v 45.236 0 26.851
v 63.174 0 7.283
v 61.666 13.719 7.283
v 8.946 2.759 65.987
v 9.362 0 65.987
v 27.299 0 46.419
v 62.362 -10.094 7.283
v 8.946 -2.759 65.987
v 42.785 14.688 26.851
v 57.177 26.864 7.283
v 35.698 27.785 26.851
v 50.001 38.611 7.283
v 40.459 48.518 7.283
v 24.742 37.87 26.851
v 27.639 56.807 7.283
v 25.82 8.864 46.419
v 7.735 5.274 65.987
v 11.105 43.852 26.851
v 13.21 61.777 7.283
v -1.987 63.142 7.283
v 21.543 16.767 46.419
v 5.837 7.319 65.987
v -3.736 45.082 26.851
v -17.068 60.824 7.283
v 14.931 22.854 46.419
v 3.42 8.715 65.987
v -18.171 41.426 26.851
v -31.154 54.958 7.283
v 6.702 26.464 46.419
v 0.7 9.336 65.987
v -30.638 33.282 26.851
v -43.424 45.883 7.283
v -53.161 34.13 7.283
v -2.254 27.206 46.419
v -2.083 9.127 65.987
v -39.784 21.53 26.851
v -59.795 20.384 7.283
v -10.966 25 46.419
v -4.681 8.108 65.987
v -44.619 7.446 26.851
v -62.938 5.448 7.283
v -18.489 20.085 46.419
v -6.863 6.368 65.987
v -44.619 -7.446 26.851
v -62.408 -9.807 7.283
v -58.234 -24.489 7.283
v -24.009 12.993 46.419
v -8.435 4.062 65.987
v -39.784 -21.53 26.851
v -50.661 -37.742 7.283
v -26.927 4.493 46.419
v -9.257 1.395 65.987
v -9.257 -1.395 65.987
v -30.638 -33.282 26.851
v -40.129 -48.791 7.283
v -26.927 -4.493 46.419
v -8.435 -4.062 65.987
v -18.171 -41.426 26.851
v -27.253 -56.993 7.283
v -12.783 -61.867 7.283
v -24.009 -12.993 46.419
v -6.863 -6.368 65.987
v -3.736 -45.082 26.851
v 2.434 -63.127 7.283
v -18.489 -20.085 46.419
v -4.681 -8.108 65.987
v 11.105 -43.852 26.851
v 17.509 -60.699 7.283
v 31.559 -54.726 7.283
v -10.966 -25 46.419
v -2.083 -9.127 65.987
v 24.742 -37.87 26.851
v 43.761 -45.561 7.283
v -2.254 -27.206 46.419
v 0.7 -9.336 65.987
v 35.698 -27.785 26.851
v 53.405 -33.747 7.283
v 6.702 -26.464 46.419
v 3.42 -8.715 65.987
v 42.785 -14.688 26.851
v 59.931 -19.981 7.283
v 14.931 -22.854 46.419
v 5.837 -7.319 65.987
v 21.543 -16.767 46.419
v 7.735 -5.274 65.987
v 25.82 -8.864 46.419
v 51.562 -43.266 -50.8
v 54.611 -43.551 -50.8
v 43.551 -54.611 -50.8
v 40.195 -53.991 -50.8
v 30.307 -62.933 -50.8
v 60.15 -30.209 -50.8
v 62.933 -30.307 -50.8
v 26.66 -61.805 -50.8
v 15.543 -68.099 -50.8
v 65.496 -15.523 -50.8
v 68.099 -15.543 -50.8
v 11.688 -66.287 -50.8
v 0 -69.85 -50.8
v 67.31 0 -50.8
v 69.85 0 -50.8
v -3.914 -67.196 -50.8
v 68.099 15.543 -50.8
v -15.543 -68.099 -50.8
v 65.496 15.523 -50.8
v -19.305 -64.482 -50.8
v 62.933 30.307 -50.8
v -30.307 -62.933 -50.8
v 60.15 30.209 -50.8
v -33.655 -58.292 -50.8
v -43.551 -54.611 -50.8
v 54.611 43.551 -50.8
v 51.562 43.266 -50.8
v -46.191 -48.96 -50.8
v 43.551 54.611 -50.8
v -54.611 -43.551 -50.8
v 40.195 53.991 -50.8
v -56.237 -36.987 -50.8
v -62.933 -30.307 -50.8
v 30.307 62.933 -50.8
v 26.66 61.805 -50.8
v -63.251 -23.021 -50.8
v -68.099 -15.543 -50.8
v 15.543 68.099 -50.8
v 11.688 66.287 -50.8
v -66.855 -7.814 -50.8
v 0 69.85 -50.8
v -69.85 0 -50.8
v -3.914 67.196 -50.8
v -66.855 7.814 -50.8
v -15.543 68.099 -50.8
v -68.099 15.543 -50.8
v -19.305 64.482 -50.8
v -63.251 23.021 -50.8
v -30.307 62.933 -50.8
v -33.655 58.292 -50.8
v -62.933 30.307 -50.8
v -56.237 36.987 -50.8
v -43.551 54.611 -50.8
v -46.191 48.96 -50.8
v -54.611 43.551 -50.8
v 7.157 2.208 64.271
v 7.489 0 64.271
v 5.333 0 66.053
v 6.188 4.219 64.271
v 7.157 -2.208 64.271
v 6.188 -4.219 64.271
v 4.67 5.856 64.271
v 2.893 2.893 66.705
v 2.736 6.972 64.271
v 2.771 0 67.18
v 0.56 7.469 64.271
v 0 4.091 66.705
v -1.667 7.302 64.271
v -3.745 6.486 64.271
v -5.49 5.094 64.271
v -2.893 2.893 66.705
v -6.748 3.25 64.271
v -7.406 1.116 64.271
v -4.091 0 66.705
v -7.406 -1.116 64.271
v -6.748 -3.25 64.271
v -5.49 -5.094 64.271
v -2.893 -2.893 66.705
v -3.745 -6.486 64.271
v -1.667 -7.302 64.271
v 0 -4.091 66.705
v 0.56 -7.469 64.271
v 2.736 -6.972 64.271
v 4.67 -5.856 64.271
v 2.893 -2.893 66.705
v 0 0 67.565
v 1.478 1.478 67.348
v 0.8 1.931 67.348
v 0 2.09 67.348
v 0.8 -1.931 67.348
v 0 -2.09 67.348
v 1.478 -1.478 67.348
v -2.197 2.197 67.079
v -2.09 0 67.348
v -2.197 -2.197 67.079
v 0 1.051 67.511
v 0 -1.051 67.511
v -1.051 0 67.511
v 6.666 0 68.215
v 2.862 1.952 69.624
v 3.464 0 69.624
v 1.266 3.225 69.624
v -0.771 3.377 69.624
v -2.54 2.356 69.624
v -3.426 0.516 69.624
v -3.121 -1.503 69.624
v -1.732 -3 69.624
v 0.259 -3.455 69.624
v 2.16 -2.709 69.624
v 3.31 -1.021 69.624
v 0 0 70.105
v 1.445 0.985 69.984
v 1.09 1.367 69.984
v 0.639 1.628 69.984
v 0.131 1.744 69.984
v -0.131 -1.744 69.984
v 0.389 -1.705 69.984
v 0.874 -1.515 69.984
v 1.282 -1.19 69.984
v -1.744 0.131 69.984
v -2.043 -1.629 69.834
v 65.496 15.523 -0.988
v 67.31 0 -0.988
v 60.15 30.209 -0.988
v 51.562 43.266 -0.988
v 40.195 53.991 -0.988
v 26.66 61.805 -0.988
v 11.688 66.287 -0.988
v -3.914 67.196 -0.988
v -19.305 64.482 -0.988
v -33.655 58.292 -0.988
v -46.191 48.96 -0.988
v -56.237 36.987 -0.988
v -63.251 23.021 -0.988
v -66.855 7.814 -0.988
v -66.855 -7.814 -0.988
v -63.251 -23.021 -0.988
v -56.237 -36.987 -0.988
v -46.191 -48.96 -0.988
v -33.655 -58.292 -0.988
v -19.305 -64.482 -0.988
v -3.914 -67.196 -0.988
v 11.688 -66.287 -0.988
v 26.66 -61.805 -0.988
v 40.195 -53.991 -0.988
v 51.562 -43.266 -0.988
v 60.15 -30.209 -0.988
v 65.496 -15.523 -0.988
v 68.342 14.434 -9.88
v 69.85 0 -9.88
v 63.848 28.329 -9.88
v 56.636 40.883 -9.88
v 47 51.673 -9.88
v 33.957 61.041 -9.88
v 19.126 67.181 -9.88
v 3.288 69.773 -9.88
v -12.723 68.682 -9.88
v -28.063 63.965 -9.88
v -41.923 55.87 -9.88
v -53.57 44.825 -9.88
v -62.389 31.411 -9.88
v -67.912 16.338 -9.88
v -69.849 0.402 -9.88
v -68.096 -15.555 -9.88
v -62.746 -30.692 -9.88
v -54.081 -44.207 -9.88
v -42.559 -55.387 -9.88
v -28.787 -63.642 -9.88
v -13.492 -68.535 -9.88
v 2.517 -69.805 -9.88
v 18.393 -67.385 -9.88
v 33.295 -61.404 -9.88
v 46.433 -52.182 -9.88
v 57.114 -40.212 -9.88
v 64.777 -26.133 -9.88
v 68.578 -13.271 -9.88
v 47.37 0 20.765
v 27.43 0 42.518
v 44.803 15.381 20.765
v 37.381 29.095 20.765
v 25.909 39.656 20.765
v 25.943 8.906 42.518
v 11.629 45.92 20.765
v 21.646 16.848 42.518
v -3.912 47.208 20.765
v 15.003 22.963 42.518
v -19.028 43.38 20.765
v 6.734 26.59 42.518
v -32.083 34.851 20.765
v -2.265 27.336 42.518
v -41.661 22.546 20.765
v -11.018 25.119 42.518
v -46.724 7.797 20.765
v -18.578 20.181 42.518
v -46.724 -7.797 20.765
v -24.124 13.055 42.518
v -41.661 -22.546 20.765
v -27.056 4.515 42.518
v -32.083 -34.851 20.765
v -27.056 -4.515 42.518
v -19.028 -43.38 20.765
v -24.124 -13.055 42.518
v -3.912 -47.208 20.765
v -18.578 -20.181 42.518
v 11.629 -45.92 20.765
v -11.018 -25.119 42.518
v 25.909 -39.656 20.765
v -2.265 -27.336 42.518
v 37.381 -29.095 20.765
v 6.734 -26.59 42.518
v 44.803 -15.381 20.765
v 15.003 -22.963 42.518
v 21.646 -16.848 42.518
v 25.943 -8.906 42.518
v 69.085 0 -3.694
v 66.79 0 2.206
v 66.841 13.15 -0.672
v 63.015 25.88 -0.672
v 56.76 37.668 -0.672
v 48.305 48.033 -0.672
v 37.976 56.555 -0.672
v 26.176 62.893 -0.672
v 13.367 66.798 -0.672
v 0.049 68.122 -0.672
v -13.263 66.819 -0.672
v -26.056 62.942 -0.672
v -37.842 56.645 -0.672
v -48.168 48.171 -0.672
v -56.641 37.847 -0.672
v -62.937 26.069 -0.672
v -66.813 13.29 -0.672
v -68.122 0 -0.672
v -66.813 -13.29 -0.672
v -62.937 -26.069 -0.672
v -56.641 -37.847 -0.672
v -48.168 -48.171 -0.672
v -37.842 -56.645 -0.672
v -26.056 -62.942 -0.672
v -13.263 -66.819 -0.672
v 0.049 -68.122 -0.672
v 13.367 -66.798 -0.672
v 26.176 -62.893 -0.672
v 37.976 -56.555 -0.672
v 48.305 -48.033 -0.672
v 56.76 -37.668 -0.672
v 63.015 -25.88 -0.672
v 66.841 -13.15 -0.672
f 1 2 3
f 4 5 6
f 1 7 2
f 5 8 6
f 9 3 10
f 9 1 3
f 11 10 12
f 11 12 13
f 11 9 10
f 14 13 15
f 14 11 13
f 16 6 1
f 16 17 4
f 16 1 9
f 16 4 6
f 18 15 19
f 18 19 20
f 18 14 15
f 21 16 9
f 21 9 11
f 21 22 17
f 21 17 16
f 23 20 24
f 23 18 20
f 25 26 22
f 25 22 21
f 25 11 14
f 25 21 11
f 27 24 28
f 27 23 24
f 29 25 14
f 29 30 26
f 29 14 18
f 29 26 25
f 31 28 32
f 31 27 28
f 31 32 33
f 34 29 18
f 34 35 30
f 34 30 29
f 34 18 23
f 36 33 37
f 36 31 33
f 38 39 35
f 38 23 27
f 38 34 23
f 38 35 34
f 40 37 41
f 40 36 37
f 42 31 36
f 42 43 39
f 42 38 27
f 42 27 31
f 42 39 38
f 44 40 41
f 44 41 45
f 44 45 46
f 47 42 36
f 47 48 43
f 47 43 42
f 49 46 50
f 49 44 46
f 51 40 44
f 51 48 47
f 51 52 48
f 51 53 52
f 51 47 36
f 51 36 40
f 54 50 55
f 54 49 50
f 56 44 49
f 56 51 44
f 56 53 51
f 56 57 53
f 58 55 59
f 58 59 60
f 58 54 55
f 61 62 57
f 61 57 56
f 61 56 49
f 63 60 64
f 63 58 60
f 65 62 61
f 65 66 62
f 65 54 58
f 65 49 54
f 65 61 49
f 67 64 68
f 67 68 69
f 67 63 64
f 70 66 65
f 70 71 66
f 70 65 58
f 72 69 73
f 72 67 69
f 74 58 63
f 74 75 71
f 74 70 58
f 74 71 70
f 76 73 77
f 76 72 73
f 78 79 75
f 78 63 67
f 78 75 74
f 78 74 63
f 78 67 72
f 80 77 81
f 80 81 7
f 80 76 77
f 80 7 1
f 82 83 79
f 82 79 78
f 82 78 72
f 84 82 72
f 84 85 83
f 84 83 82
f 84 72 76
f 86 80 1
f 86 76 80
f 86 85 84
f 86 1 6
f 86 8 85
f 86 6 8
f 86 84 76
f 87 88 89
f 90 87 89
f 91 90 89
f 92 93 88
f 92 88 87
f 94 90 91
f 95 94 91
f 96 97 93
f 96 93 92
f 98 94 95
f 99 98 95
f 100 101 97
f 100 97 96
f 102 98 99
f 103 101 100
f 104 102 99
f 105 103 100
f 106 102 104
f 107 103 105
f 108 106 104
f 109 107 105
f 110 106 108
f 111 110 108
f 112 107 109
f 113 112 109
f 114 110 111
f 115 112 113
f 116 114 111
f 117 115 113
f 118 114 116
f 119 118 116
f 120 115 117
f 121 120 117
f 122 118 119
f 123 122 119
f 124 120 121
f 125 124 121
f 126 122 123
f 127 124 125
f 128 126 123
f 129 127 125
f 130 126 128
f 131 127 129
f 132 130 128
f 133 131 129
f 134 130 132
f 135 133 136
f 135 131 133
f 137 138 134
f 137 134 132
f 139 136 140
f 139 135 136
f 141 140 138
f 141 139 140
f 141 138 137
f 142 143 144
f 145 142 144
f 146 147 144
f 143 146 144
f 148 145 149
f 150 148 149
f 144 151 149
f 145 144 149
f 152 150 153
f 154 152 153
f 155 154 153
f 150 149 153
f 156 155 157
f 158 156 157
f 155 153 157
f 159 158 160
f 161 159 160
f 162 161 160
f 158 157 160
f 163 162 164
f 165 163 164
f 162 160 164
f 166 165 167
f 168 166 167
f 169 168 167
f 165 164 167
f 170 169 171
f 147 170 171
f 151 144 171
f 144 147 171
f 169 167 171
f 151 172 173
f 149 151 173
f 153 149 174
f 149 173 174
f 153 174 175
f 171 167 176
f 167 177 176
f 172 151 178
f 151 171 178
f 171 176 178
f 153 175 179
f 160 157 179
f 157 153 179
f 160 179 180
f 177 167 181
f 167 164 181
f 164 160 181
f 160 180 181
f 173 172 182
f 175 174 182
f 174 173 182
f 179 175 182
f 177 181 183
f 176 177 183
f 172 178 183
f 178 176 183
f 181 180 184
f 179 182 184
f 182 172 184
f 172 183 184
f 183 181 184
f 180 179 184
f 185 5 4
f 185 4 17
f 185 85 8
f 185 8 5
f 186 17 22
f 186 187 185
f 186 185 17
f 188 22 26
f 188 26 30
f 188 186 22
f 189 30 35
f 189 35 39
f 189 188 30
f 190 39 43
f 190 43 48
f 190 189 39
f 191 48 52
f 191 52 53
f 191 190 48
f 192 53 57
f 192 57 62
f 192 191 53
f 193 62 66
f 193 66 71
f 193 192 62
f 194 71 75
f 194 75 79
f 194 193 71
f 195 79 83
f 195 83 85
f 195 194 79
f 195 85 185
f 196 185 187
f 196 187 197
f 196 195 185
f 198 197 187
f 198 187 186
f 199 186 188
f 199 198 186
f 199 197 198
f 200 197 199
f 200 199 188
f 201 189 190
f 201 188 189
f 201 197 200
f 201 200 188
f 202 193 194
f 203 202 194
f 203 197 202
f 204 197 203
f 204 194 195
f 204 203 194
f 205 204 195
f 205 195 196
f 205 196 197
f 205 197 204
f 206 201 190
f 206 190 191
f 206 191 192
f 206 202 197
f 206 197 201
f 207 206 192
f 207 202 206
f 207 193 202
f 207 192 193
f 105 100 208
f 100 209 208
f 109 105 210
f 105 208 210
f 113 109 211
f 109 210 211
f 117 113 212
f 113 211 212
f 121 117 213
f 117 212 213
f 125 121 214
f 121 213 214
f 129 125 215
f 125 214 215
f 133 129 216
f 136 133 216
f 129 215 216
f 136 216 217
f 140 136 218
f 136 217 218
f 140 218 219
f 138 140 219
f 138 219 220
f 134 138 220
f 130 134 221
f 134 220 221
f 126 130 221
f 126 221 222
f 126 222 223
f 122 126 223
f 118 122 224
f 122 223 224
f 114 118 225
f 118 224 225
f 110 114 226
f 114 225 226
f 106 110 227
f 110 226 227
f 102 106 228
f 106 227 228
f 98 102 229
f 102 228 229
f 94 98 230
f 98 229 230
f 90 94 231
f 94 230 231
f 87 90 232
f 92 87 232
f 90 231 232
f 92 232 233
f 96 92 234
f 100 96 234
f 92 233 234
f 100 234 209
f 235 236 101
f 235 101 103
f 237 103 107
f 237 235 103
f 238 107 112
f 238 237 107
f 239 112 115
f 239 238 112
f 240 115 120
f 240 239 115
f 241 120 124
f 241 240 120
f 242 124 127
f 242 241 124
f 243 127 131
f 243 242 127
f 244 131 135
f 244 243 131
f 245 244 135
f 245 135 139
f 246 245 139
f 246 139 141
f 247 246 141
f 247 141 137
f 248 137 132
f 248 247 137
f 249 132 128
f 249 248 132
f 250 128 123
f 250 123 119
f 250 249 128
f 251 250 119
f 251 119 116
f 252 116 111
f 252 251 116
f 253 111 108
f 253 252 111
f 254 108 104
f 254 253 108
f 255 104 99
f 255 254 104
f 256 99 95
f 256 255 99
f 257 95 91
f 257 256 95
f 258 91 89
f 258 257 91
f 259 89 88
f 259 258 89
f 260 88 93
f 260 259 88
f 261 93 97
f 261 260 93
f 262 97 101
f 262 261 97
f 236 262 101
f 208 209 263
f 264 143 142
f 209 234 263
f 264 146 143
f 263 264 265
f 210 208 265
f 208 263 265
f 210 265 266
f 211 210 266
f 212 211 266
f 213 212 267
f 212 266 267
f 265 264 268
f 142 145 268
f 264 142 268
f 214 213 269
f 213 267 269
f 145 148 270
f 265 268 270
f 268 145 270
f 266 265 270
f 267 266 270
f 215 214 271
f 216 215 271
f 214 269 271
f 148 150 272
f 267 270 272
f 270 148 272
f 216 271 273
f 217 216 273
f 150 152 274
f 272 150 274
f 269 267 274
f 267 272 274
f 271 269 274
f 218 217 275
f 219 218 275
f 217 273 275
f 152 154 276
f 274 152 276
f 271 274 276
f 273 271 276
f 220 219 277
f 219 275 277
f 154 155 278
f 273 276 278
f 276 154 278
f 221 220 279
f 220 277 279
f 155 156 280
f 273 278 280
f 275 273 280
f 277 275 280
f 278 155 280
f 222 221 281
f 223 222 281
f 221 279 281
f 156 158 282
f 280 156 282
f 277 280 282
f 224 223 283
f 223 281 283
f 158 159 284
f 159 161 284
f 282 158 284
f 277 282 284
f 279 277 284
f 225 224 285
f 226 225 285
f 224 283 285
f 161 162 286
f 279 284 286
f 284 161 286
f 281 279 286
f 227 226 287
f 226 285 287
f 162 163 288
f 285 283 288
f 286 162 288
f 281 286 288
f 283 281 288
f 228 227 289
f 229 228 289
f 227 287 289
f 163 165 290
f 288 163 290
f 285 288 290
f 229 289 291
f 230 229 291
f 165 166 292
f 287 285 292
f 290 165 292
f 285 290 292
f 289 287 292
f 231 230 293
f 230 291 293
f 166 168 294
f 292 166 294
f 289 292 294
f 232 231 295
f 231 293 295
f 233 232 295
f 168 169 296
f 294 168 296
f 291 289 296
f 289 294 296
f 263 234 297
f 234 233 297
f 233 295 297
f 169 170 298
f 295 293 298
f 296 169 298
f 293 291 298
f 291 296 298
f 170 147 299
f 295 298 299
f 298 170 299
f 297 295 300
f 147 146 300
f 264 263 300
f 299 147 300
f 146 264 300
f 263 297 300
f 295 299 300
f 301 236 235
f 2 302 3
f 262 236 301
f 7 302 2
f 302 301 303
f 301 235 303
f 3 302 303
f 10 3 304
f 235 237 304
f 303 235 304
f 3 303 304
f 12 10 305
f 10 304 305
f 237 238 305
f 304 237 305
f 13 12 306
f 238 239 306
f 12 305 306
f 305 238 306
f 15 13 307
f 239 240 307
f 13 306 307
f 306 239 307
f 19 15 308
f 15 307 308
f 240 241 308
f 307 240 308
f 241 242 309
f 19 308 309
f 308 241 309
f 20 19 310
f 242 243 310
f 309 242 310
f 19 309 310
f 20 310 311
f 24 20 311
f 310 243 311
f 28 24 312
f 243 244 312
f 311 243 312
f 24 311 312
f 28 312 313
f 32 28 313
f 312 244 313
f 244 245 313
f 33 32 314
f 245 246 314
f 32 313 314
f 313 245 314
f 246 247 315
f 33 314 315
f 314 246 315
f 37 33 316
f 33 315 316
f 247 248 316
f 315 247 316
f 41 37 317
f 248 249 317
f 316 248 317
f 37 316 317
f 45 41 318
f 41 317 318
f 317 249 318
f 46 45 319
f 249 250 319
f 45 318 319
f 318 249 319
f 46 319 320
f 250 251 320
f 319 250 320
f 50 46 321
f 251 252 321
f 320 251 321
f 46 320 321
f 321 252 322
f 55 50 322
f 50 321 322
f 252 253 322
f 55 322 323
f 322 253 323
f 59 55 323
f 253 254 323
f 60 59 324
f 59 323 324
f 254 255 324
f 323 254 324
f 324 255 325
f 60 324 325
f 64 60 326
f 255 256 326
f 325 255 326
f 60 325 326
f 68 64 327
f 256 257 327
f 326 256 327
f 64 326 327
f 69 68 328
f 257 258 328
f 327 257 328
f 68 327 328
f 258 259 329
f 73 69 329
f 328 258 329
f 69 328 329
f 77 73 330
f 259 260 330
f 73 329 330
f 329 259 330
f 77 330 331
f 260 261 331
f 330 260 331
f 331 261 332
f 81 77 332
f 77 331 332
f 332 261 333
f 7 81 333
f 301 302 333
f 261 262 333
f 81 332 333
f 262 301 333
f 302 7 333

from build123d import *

# Parameters (mm, degrees)
F0_W = 69.85
F0_H = 50.8
F2_T = -2.54
F3_R = 25.4


with BuildPart() as f1:
    # F0 (on Front) → F1 (revolve)
    with BuildSketch(Plane.XZ):
        with Locations((34.925, -25.4)):
            Rectangle(F0_W, F0_H)
        with BuildLine():
            Line((0, 70.105362), (0, 0))
            Line((0, 0), (69.85, 0))
            Line((69.85, 0), (9.361858, 65.987064))
            ThreePointArc((9.361858, 65.987064), (5.113823, 69.030284), (0, 70.105362))
        make_face()
    revolve(axis=Axis((0, 0, 38.1), (0, 0, 1)))

    # F2
    f2_openings = [f1.faces().sort_by_distance(p)[0] for p in [
        (0, 0, -50.8),
    ]]
    offset(amount=F2_T, openings=f2_openings)

    # F3
    f3_edges = [f1.edges().sort_by_distance(p)[0] for p in [
        (-69.85, 0, 0),
    ]]
    fillet(f3_edges, radius=F3_R)


solid = f1.part
